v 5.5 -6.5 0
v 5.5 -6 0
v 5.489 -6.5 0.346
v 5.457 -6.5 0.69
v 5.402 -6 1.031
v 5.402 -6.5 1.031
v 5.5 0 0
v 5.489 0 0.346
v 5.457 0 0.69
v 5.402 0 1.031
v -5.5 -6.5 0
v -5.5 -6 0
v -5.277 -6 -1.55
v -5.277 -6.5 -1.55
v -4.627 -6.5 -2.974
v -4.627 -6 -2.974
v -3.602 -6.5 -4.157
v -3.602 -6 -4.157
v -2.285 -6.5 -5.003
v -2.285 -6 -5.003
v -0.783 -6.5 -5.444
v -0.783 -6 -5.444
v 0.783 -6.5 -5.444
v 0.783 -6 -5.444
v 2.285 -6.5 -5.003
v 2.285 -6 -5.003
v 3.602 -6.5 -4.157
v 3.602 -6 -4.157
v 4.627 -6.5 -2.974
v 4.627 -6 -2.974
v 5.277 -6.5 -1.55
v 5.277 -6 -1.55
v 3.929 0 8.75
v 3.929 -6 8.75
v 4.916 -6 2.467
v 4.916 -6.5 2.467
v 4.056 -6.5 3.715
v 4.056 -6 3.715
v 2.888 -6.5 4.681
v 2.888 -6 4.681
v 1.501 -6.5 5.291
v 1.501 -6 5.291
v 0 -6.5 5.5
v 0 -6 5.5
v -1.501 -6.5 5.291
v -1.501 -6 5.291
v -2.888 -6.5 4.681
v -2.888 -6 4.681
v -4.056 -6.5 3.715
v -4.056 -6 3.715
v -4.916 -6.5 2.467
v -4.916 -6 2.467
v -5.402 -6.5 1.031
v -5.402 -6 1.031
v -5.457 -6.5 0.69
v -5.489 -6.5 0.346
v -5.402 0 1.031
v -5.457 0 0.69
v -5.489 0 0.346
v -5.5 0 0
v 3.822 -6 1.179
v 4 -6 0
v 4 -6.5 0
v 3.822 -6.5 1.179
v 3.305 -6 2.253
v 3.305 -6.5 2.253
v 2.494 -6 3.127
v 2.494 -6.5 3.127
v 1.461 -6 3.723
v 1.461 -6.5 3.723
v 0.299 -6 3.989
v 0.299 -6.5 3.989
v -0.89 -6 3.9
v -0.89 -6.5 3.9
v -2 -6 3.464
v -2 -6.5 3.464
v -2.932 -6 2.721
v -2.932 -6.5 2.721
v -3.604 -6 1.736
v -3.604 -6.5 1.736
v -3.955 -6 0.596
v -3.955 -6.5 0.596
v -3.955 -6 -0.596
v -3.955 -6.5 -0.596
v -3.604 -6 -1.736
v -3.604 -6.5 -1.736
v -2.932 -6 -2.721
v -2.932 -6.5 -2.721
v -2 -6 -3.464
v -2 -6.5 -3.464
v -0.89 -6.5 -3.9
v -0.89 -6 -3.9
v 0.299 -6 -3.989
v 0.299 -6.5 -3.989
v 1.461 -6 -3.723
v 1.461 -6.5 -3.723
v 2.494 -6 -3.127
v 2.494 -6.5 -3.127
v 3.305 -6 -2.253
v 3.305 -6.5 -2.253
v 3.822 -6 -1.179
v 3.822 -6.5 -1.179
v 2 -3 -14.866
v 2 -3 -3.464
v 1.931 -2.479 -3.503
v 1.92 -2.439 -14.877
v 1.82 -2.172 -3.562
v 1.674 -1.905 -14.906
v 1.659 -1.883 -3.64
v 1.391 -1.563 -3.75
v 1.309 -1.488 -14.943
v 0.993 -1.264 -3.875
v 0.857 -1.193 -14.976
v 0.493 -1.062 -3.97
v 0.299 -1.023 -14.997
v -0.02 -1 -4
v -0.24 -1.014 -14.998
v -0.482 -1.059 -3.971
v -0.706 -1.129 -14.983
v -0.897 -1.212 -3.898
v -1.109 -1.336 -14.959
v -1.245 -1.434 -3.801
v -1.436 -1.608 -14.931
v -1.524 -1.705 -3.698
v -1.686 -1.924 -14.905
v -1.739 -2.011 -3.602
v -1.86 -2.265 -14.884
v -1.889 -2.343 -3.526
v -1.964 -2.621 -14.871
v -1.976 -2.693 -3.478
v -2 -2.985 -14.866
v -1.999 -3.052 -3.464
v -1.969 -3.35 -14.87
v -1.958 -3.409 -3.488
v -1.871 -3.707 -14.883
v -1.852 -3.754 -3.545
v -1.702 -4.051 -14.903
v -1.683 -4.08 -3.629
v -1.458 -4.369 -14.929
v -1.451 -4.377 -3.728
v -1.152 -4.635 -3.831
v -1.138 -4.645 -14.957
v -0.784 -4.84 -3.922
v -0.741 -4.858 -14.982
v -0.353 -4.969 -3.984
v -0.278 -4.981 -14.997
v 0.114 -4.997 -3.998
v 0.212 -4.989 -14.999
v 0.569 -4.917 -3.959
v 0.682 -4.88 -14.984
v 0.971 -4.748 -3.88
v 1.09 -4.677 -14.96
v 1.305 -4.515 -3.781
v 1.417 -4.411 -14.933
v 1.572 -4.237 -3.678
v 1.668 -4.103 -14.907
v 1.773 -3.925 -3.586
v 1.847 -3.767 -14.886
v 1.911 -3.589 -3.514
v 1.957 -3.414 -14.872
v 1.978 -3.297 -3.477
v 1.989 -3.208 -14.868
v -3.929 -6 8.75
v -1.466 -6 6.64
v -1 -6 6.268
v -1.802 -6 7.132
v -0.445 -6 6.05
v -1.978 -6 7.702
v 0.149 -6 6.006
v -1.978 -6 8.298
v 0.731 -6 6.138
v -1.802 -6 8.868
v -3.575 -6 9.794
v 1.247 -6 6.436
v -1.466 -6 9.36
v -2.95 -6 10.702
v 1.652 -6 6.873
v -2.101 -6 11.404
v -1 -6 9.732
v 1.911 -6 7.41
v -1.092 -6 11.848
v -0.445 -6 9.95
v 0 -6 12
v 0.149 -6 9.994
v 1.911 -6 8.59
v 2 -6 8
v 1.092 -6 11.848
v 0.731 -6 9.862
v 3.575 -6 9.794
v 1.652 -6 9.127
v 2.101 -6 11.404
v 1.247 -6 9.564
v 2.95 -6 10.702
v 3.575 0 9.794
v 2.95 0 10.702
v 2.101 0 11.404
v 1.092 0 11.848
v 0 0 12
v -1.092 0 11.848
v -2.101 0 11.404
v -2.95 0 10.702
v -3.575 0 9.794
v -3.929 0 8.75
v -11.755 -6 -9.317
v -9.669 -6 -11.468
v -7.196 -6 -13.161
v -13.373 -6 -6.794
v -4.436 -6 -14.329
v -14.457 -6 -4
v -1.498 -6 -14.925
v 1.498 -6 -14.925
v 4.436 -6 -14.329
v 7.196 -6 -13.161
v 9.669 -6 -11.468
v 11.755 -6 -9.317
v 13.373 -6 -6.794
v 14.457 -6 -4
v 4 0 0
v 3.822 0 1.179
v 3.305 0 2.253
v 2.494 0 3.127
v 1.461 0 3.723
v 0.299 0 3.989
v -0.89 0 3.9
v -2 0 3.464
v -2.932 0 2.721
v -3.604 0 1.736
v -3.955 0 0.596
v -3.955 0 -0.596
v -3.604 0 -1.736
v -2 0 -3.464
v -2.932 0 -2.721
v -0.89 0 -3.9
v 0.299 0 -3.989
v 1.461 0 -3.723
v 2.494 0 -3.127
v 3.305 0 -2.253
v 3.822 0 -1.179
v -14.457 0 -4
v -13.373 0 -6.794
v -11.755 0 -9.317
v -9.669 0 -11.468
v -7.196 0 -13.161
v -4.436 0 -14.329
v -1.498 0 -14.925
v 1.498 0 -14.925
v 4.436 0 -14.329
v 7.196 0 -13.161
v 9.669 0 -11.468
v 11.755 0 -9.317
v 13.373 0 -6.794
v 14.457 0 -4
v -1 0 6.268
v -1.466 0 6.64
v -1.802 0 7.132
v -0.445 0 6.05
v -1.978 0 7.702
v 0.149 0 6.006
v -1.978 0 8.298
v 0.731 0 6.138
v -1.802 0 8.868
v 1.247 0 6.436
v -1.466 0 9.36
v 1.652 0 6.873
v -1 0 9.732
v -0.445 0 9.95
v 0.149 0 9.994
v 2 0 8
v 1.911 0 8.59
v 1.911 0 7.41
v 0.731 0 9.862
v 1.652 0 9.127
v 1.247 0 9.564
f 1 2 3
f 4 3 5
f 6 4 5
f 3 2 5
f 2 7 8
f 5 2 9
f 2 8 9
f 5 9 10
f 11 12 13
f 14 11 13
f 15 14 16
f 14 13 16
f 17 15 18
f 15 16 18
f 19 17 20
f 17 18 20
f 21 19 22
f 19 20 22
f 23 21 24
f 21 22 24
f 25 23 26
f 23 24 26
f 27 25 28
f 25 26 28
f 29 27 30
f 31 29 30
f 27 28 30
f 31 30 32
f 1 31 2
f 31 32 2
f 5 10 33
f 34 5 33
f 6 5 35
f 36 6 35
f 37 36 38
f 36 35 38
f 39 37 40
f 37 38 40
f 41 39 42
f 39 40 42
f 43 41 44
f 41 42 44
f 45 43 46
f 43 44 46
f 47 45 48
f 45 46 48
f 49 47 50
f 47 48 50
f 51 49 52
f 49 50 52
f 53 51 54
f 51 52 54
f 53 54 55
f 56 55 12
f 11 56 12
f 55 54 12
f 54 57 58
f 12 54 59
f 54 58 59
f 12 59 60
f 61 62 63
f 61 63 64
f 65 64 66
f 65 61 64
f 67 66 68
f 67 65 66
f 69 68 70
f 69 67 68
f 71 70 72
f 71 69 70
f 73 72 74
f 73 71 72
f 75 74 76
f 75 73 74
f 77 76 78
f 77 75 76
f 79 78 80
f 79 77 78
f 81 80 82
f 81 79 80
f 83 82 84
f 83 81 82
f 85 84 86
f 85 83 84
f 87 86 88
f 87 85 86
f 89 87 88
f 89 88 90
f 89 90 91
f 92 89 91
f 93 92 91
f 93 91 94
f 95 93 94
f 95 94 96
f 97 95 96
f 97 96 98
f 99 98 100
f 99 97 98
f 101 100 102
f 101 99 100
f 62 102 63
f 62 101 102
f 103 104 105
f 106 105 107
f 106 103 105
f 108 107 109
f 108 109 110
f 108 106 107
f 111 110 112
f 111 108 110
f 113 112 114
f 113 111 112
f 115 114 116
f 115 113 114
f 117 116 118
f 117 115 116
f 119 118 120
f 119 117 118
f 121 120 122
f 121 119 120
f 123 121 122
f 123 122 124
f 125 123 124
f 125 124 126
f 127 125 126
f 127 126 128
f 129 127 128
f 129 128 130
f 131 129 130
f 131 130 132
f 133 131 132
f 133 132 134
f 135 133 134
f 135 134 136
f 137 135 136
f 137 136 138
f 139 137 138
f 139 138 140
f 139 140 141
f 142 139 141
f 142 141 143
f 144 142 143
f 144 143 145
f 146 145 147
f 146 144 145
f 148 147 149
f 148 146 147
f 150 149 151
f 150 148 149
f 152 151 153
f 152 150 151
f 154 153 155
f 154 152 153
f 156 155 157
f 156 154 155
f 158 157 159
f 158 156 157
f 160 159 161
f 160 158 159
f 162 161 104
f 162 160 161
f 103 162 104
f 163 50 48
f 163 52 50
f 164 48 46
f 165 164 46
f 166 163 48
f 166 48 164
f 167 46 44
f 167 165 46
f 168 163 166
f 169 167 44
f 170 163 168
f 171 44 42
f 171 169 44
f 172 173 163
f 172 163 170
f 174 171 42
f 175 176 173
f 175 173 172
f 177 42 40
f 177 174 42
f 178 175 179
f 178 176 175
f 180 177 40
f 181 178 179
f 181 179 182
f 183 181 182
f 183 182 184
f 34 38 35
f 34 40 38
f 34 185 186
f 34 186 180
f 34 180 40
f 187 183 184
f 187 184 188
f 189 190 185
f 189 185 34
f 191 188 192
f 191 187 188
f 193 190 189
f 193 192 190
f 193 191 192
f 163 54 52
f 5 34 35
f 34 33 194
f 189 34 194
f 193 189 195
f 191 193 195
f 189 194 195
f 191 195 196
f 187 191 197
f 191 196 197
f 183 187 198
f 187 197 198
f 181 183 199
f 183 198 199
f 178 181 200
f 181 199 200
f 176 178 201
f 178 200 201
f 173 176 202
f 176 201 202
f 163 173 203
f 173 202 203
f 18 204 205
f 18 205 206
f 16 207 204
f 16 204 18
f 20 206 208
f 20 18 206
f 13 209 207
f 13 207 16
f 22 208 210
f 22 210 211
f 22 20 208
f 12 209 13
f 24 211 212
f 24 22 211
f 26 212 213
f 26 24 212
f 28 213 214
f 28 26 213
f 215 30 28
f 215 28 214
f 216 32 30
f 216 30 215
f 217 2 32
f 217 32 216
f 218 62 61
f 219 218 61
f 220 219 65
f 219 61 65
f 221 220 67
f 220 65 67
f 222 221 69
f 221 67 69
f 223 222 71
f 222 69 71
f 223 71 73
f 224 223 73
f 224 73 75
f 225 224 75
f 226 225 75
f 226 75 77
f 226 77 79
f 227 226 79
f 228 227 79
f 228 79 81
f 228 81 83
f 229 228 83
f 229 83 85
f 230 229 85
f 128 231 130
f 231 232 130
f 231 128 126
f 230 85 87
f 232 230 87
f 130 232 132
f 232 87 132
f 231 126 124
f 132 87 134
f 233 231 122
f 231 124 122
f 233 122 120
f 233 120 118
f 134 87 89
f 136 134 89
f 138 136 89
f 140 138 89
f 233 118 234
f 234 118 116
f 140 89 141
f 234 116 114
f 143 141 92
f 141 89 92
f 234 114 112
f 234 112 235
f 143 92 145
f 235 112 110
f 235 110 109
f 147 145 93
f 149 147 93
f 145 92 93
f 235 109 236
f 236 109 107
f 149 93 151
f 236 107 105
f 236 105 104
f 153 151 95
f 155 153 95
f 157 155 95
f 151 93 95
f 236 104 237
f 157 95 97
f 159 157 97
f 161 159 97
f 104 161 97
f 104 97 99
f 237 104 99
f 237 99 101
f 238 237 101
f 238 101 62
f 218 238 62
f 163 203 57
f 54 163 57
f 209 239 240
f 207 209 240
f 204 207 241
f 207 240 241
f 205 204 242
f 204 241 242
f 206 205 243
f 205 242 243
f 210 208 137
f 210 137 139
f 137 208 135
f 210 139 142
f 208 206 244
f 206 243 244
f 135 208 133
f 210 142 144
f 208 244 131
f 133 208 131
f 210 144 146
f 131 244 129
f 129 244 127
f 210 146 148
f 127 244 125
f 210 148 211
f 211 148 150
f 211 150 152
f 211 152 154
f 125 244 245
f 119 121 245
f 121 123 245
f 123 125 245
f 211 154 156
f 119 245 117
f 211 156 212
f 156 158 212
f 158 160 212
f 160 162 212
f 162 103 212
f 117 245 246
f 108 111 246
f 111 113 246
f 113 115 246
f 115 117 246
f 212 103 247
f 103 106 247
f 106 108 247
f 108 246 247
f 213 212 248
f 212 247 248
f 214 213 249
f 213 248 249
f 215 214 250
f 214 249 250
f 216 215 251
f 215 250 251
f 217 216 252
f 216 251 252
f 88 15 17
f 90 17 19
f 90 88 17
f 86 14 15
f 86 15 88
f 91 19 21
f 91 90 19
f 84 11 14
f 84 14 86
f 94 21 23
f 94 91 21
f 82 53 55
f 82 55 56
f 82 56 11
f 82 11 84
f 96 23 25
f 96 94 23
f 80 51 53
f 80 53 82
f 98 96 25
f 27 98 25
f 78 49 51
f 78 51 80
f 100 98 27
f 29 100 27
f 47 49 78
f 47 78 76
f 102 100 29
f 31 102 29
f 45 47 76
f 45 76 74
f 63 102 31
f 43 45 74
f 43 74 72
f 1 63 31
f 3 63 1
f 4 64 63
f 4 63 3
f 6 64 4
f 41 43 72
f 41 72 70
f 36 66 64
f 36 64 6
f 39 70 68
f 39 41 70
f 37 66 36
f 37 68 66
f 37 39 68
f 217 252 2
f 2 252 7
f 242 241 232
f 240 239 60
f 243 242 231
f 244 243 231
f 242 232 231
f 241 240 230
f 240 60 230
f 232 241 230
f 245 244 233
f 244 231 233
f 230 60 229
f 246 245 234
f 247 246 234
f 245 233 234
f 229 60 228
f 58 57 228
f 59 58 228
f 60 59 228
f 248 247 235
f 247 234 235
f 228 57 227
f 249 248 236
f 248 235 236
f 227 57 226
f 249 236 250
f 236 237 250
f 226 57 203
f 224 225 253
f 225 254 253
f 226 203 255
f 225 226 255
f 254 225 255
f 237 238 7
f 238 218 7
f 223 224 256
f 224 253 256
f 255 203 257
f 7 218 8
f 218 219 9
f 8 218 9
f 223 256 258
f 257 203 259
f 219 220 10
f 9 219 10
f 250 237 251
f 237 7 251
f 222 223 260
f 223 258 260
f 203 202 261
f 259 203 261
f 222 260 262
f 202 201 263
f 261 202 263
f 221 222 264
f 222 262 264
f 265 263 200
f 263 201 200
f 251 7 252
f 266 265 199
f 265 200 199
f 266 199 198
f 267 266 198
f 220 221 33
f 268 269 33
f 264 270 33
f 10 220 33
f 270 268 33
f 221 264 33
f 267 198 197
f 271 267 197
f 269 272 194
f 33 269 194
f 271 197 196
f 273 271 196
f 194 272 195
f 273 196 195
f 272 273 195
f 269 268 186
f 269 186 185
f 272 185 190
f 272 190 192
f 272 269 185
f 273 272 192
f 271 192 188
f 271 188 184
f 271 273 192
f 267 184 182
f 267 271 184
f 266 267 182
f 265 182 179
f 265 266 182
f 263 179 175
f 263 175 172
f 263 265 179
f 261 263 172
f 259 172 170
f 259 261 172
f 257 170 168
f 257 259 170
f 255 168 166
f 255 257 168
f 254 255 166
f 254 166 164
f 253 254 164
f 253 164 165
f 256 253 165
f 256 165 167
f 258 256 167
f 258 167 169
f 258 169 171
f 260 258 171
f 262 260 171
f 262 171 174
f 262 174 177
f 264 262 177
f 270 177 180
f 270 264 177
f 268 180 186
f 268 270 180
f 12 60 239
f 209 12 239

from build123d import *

# Parameters (mm, degrees)
F0_R     = 2
F1_DEPTH = 6
F2_R     = 4
F3_DEPTH = 25
F4_R     = 4
F5_DEPTH = 0.5
F7_R     = 2
F8_DEPTH = 12.535898485


with BuildPart() as f1:
    # F0 (on Front) → F1 (new body)
    with BuildSketch(Plane.XZ):
        with BuildLine():
            Line((-5.5, 0), (-14.4568322948, -4))
            ThreePointArc((-14.4568322948, -4), (0, -15), (14.4568322948, -4))
            Line((14.4568322948, -4), (5.5, 0))
            ThreePointArc((5.5, 0), (5.4755595256, 0.5179265218), (5.4024553156, 1.03125))
            Line((5.4024553156, 1.03125), (3.9290584114, 8.75))
            ThreePointArc((3.9290584114, 8.75), (0, 12), (-3.9290584114, 8.75))
            Line((-3.9290584114, 8.75), (-5.4024553156, 1.03125))
            ThreePointArc((-5.4024553156, 1.03125), (-5.4755595256, 0.5179265218), (-5.5, 0))
        make_face()
        with Locations((0, 8)):
            Circle(F0_R, mode=Mode.SUBTRACT)
    extrude(amount=F1_DEPTH)

    # F2 (on face) → F3 (cut)
    with BuildSketch(Plane.XZ.offset(6)):
        Circle(F2_R)
    extrude(amount=-F3_DEPTH, mode=Mode.SUBTRACT)

    # F4 (on face) → F5 (join)
    with BuildSketch(Plane.XZ.offset(6)):
        with BuildLine():
            ThreePointArc((-5.5, 0), (0, -5.5), (5.5, 0))
            ThreePointArc((5.5, 0), (5.4755595256, 0.5179265218), (5.4024553156, 1.03125))
            ThreePointArc((5.4024553156, 1.03125), (0, 5.5), (-5.4024553156, 1.03125))
            ThreePointArc((-5.4024553156, 1.03125), (-5.4755595256, 0.5179265218), (-5.5, 0))
        make_face()
        Circle(F4_R, mode=Mode.SUBTRACT)
    extrude(amount=F5_DEPTH)

    # F7 (on offset) → F8 (cut, up to face)
    with BuildSketch(Plane.XY.offset(-15)):
        with Locations((0, -3)):
            Circle(F7_R)
    extrude(amount=F8_DEPTH, mode=Mode.SUBTRACT)


solid = f1.part
